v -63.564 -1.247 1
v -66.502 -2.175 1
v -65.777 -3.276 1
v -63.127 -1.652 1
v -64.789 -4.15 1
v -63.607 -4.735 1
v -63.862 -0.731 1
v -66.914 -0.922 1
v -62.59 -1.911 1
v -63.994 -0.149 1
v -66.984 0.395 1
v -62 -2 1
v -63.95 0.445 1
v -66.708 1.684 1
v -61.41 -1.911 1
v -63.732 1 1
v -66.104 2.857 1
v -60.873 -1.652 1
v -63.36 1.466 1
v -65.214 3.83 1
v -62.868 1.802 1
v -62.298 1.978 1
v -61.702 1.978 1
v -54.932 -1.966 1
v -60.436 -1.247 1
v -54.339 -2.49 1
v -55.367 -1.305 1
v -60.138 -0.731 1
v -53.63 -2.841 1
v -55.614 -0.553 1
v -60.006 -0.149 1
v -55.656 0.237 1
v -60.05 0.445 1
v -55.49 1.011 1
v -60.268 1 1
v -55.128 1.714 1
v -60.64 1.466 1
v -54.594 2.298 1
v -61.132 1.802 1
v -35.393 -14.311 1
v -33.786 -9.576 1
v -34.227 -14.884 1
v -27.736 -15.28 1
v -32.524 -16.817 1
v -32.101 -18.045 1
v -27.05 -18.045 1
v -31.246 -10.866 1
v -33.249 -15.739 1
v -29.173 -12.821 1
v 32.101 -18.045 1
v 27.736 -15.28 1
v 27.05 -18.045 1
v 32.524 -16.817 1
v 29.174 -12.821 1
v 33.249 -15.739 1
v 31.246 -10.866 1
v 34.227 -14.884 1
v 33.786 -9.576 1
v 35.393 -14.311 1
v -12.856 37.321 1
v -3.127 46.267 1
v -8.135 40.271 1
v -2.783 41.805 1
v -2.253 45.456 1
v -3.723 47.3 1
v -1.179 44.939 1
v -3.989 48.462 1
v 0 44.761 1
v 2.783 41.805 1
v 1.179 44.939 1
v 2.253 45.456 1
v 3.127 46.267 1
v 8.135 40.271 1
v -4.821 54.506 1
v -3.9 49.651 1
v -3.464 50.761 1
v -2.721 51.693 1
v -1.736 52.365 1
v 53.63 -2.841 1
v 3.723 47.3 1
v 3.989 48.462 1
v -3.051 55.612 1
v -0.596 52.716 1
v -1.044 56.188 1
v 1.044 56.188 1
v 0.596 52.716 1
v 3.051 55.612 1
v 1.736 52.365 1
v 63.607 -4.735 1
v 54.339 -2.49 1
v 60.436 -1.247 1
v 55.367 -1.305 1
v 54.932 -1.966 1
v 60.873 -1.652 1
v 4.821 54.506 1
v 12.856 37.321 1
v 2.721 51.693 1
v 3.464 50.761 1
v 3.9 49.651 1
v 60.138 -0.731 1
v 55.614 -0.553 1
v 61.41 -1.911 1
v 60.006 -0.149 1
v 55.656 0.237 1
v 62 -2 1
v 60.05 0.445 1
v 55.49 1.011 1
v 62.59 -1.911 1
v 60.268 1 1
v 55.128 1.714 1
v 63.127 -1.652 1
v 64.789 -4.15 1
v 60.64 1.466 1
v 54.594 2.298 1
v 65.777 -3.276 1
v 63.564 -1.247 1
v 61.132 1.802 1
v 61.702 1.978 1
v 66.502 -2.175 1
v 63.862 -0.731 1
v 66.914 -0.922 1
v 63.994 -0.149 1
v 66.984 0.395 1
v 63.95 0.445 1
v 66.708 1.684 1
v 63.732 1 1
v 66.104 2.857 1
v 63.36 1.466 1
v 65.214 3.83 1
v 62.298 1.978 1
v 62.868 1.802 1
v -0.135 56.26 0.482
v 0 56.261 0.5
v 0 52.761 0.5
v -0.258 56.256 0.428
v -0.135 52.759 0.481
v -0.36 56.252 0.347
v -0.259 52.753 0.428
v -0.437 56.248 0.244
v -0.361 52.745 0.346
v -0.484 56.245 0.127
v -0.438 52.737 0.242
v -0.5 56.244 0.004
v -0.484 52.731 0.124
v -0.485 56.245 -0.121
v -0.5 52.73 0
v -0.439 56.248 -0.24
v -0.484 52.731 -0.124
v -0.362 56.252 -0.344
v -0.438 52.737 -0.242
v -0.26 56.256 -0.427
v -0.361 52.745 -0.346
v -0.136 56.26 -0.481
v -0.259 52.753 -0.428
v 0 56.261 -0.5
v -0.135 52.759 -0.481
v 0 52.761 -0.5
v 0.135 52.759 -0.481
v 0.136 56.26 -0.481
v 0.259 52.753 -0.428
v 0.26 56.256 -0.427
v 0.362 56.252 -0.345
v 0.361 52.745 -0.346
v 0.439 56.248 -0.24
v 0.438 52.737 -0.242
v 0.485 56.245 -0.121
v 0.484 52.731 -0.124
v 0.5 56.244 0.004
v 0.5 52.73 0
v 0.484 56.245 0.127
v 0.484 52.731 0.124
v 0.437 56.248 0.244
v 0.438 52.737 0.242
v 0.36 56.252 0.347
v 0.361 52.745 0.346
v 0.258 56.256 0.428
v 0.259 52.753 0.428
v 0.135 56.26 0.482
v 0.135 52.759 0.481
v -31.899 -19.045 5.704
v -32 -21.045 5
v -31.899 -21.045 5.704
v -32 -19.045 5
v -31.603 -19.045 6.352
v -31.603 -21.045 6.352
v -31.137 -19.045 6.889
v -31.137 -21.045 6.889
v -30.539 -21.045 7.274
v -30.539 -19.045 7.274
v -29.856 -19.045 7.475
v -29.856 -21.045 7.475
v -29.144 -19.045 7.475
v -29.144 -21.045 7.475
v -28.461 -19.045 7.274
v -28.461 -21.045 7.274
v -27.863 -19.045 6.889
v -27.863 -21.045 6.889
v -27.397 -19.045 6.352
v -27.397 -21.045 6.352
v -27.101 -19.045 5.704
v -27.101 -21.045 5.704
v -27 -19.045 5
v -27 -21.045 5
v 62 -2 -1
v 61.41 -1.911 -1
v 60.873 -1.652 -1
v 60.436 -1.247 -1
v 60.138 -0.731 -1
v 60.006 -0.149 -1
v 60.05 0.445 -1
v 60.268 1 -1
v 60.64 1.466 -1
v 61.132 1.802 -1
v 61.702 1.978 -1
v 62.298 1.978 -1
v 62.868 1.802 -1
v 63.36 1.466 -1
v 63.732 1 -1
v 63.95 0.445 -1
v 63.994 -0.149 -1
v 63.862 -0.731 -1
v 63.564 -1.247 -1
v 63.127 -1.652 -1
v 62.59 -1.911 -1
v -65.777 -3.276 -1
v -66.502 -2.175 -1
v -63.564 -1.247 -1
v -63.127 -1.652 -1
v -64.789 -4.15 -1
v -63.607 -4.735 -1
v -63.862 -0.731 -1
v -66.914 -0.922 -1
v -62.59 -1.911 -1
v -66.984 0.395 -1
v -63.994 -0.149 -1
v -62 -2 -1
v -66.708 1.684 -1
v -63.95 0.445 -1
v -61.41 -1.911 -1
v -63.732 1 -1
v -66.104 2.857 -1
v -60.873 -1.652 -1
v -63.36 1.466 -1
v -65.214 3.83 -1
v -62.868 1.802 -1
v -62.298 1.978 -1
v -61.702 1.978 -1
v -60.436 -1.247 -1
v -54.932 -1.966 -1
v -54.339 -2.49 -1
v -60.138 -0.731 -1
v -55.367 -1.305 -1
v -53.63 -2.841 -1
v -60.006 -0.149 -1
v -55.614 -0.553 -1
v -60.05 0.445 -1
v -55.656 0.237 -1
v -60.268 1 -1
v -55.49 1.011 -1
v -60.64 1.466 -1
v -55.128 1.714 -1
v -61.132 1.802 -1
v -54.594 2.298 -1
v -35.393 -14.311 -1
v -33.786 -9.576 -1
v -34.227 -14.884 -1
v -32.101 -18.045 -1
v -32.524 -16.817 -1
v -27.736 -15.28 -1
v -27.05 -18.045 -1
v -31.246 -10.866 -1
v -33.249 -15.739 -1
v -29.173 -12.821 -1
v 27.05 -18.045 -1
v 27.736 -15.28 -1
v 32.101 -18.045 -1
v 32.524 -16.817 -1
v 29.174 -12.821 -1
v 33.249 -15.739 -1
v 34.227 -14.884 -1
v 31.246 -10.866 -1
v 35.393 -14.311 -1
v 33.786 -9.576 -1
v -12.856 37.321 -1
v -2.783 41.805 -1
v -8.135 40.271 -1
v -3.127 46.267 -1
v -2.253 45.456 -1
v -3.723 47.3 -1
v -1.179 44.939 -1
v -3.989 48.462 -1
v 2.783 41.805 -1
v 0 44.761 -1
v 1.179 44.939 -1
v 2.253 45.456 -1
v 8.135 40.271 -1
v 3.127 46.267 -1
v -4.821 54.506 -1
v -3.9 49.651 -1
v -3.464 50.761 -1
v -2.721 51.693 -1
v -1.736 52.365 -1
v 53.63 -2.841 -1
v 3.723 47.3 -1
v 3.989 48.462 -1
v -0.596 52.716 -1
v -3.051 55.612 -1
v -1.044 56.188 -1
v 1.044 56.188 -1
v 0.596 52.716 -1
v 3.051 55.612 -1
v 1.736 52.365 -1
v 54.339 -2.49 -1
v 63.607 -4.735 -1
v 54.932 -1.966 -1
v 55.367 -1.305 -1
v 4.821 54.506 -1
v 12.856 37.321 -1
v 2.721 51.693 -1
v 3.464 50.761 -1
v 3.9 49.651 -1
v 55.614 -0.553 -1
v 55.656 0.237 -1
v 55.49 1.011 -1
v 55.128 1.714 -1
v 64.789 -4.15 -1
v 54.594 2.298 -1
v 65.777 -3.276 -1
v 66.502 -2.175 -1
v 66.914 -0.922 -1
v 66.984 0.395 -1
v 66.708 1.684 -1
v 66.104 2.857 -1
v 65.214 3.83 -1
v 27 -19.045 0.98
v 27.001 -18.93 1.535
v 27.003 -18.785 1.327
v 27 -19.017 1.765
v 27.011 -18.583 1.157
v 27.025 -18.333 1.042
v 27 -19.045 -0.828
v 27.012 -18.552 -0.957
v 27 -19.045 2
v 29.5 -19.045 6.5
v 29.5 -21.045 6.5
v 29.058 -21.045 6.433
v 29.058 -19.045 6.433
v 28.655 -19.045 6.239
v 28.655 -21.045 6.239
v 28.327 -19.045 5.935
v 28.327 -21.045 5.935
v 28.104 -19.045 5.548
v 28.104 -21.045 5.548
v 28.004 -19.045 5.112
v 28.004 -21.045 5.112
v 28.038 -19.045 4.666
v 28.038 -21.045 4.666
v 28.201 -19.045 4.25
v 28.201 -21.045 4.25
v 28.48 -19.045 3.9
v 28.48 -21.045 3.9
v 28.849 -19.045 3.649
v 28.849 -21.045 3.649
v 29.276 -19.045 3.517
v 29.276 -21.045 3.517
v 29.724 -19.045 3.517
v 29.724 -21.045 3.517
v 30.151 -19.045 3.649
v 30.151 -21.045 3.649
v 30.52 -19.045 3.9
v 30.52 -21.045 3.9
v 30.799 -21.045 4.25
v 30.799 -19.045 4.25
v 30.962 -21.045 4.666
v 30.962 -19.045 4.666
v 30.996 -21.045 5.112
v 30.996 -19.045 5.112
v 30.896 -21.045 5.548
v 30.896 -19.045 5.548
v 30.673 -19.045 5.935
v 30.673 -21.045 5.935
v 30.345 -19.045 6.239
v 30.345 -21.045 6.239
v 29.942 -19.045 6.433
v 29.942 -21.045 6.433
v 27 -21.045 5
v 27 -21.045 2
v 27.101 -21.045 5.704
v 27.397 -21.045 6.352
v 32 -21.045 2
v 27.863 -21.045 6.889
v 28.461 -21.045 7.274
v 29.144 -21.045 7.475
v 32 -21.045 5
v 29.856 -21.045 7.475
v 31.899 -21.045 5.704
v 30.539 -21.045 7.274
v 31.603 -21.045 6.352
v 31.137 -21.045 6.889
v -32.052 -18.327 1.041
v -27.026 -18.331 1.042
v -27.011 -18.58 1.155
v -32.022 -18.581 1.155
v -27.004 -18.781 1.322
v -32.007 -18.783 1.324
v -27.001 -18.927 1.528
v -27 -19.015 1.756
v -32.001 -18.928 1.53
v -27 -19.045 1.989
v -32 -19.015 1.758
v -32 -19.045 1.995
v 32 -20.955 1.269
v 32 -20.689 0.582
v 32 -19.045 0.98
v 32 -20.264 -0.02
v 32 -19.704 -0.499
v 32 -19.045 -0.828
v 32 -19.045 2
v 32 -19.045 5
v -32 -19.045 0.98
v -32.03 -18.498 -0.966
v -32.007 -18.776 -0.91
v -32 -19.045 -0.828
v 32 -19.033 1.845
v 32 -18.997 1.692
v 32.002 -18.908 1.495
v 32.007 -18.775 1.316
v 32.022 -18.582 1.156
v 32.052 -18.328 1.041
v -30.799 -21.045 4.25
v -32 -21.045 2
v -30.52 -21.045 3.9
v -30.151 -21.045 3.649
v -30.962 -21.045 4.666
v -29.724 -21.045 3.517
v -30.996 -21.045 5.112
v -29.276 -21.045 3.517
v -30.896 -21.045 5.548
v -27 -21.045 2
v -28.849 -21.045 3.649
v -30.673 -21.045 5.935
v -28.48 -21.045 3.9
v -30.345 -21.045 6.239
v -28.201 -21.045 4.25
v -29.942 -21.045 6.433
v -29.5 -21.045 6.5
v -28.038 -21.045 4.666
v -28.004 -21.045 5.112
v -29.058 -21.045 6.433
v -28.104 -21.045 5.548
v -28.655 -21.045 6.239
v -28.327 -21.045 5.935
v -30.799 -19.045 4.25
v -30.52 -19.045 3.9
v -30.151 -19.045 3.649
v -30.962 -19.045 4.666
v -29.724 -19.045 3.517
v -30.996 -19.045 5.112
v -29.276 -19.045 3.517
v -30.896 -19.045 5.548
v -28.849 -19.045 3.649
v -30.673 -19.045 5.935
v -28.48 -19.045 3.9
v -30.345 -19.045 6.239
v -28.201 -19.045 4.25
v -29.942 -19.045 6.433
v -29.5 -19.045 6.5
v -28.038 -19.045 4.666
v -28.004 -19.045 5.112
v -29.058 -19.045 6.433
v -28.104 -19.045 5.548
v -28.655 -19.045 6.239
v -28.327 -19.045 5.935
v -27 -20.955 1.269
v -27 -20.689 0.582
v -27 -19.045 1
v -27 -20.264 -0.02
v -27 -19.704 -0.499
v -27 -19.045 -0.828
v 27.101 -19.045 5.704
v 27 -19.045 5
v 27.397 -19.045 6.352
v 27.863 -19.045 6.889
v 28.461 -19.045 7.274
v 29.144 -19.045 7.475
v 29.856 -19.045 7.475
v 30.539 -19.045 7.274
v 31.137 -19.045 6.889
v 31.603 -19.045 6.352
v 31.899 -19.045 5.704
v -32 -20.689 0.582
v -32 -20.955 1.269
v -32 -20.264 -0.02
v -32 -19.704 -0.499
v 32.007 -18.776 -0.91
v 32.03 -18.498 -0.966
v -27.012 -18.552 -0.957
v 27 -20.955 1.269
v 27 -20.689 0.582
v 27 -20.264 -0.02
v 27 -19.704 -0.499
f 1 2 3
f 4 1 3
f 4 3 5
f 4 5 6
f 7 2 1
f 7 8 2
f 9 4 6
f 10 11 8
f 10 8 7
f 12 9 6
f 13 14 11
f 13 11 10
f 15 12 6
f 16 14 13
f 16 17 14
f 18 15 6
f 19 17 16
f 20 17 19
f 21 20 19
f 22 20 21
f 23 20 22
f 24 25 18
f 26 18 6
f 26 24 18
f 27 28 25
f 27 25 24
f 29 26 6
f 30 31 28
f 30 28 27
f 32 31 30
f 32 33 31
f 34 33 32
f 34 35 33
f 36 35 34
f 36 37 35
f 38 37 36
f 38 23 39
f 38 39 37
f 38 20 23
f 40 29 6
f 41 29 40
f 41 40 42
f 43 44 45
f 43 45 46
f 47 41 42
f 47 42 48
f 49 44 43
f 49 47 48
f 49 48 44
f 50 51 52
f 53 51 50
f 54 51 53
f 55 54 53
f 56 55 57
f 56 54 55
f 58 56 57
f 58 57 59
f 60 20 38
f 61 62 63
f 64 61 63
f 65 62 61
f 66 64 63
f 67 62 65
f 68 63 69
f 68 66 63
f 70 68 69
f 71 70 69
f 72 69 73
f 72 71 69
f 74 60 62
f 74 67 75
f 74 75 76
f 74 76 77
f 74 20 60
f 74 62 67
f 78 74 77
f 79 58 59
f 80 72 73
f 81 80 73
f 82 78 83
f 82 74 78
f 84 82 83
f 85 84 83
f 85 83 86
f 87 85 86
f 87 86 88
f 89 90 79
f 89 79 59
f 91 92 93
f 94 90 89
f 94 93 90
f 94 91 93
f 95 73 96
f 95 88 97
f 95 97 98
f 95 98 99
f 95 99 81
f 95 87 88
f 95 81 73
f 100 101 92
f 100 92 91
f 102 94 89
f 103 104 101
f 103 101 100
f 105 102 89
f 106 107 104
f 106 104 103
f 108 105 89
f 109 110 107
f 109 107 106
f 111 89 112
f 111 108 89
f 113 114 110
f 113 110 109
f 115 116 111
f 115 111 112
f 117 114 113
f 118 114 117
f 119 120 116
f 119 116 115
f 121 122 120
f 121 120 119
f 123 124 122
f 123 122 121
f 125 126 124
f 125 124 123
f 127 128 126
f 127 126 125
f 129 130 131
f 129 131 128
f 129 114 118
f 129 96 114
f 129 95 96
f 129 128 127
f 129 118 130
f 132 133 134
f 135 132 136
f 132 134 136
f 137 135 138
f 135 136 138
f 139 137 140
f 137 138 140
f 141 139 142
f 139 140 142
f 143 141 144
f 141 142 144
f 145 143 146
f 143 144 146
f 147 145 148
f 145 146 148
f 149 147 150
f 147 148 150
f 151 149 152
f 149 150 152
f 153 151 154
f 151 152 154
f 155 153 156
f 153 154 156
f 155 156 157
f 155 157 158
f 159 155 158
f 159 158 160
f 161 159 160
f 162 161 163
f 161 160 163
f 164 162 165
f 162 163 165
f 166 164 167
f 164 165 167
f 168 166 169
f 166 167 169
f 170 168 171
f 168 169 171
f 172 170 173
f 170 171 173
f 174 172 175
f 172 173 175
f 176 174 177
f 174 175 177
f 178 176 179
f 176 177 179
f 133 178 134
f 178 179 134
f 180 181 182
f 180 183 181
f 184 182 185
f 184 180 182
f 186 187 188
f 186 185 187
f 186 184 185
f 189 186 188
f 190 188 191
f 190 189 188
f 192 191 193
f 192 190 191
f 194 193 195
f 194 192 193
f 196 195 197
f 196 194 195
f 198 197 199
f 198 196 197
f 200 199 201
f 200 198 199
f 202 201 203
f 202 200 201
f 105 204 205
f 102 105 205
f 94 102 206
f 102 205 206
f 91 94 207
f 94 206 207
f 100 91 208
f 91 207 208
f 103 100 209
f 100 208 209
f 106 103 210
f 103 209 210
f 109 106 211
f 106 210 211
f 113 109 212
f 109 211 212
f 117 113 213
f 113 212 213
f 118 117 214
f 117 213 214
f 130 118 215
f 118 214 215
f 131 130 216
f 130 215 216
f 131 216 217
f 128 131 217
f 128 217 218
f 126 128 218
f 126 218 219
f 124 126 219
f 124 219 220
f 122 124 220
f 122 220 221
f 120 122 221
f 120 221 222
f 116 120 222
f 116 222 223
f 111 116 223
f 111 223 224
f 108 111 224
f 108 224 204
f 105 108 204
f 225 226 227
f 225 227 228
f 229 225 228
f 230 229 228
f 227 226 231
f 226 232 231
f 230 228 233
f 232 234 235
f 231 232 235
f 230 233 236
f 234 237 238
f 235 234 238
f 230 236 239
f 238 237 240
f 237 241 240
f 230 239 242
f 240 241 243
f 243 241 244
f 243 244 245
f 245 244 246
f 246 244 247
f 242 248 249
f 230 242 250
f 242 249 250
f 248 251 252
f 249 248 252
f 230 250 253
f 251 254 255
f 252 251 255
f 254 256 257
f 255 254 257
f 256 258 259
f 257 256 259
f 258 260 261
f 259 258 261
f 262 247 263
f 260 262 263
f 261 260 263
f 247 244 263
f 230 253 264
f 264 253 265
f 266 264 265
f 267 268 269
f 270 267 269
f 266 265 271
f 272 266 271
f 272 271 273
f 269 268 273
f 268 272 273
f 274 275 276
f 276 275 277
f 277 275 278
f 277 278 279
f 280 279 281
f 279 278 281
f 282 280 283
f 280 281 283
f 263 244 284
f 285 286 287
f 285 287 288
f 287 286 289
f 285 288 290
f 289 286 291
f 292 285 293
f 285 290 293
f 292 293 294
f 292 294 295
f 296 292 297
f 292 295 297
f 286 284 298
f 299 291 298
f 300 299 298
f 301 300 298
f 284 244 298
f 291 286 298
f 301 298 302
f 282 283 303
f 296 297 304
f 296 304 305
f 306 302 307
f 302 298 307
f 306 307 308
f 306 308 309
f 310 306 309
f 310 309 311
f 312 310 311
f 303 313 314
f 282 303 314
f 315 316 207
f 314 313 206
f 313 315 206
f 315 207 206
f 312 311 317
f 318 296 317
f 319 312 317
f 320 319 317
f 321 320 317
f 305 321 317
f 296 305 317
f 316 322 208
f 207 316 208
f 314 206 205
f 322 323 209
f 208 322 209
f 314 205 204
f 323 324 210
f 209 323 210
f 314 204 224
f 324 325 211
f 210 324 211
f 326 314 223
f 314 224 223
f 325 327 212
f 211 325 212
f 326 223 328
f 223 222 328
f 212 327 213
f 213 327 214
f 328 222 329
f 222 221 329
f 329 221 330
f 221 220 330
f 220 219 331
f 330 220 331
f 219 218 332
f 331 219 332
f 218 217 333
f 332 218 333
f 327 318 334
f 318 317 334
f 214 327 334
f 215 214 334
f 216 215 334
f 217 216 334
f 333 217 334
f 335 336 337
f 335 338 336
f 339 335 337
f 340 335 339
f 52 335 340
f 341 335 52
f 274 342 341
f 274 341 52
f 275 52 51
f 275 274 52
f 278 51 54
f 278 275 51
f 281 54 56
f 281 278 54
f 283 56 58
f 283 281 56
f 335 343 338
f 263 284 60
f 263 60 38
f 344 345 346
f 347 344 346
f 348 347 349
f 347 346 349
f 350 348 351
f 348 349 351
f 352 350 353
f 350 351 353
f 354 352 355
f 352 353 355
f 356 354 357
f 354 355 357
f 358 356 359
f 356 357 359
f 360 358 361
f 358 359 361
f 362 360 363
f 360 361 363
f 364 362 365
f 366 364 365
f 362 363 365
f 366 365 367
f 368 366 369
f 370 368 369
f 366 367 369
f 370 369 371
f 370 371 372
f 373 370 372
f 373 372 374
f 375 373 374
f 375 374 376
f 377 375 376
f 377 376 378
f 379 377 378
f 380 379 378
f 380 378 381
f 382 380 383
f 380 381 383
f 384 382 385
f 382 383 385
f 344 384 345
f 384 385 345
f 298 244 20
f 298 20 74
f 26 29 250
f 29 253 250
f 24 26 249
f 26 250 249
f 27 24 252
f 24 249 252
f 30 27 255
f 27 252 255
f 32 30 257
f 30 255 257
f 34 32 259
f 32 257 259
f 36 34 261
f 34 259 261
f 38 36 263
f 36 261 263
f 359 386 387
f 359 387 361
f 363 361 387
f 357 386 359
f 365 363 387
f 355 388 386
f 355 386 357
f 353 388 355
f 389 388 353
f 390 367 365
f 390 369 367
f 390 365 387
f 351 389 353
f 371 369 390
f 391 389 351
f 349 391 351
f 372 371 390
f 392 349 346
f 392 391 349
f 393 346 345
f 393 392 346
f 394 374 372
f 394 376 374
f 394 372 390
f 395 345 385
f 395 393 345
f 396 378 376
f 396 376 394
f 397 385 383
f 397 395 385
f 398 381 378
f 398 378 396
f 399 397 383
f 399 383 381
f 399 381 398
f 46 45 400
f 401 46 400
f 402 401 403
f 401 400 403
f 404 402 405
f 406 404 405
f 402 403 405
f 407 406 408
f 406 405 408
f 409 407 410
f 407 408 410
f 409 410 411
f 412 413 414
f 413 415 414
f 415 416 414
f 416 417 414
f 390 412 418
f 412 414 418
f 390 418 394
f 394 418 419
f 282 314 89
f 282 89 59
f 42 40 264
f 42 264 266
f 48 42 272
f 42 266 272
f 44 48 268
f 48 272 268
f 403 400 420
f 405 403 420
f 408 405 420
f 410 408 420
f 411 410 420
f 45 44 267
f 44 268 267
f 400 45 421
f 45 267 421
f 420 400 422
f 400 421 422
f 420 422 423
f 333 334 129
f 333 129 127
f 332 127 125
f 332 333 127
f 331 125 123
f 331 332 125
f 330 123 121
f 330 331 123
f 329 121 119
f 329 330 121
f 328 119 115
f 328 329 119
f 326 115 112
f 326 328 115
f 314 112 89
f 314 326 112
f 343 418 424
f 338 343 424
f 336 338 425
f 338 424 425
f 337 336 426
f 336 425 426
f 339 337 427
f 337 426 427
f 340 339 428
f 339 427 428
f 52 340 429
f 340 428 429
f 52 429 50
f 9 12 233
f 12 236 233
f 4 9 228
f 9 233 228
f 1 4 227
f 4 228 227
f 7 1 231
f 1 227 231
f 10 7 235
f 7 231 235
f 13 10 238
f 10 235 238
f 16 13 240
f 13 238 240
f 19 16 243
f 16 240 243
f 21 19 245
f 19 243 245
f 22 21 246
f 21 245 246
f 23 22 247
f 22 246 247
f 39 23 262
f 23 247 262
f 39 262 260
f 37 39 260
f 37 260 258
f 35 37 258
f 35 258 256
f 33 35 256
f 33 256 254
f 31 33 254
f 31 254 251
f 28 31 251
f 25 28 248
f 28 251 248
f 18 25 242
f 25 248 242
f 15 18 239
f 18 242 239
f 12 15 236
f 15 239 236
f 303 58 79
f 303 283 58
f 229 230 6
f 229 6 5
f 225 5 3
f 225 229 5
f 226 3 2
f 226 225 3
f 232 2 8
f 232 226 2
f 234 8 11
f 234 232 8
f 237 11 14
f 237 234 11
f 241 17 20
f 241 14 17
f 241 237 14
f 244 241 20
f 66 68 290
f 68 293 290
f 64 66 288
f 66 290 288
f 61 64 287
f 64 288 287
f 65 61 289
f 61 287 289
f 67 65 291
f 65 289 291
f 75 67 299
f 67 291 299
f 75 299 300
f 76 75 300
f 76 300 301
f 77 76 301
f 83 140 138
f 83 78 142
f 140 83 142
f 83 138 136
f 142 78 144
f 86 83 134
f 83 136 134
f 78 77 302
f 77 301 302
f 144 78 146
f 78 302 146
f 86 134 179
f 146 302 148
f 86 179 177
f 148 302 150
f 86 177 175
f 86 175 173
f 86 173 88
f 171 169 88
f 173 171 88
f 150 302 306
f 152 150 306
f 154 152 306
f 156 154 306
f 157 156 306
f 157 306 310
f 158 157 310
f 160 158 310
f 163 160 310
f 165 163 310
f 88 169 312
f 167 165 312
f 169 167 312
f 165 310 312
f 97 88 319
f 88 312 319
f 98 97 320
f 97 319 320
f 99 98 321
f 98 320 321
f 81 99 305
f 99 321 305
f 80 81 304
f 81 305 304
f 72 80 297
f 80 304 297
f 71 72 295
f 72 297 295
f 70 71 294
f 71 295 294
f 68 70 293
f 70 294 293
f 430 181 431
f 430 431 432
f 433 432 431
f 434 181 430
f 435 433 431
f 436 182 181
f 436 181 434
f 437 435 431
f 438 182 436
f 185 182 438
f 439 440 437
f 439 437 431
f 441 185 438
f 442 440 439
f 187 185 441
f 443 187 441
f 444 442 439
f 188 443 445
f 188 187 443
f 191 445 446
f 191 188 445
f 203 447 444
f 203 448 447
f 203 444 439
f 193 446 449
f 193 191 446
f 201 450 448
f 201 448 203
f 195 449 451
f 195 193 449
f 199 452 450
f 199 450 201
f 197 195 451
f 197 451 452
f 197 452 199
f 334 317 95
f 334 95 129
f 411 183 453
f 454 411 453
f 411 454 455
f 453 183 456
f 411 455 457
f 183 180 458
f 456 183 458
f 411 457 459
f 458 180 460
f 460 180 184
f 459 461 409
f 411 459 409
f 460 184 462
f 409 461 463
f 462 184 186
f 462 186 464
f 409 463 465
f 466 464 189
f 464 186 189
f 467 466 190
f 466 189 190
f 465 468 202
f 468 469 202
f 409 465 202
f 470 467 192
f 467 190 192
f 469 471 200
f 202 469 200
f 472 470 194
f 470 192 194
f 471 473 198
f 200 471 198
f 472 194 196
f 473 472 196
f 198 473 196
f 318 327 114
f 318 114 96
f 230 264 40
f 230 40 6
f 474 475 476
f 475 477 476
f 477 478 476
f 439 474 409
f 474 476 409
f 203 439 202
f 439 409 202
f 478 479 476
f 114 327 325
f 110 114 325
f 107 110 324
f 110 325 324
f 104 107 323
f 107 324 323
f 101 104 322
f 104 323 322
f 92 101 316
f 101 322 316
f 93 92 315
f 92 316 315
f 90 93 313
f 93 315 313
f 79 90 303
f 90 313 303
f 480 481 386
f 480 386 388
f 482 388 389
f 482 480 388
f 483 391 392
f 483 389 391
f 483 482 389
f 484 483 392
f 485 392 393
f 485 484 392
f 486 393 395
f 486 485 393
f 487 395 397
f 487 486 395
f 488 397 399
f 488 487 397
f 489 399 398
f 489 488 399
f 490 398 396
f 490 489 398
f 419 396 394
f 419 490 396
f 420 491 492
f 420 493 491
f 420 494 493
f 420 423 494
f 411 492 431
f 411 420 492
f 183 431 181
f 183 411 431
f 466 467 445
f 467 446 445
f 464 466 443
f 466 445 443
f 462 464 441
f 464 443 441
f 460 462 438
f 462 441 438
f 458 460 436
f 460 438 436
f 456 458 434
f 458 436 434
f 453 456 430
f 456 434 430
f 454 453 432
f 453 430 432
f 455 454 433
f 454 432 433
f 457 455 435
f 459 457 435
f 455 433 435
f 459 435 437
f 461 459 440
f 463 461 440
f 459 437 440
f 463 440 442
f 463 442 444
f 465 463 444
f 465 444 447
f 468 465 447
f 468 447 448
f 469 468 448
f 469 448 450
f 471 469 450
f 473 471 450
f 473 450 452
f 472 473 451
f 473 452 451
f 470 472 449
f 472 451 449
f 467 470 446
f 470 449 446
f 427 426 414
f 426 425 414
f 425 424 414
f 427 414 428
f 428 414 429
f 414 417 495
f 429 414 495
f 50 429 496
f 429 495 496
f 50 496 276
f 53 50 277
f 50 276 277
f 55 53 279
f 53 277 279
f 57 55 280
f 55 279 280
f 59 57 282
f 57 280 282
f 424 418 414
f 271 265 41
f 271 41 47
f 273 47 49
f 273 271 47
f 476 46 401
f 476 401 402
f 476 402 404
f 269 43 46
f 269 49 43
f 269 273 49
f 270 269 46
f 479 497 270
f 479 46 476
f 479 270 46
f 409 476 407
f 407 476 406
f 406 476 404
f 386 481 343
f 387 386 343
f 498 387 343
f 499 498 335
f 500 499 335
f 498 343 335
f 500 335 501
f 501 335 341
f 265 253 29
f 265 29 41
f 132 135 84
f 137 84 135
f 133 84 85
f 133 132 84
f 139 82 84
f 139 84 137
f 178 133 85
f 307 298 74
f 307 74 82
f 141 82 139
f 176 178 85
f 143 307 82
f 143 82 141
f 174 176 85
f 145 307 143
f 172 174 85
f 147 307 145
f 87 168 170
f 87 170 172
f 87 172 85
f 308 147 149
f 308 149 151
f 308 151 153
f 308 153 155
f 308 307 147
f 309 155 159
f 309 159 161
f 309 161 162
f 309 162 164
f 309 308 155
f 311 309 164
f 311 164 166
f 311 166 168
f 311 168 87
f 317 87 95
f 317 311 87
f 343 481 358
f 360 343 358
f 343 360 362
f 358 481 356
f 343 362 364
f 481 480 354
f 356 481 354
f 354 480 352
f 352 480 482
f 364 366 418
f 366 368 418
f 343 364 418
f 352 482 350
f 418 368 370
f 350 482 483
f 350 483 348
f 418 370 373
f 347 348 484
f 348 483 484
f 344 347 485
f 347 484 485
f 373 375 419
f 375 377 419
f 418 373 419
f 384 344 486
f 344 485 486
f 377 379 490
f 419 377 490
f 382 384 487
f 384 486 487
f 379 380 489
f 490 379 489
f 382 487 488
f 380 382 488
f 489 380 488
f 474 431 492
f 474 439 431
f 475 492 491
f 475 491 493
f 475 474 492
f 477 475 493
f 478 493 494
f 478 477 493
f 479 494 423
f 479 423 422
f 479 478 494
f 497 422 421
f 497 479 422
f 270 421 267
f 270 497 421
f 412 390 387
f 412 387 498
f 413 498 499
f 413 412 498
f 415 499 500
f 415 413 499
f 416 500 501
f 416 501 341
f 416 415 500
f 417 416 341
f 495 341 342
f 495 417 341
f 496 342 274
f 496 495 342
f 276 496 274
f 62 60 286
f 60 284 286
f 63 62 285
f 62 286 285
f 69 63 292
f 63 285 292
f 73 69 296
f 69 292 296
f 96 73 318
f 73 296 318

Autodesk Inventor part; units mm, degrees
ref_plane "YZ Plane" through (0, 0, 0) normal (1, 0, 0) x (0, 1, 0)
sketch "Sketch1" plane through (0, 0, 0) normal (0, 0, 1) x (1, 0, 0)
  line L0 (-14.081, 0) -> (14.081, 0) construction
  line L1 (0, -22) -> (0, 22) construction
  arc A0 (12.8558, 37.3209) -> (-12.8558, 37.3209) centre (0, 22) ccw
  line L2 (-65.2139, 3.8302) -> (-4.8209, 54.5062)
  arc A1 (4.8209, 54.5062) -> (-4.8209, 54.5062) centre (0, 48.7609) ccw
  line L3 (4.8209, 54.5062) -> (65.2139, 3.8302)
  arc A2 (63.607, -4.7347) -> (65.2139, 3.8302) centre (62, 0) ccw
  line L4 (63.607, -4.7347) -> (35.393, -14.3106)
  arc A3 (35.393, -14.3106) -> (32, -19.0453) centre (37, -19.0453) ccw
  line L5 (32, -19.0453) -> (32, -21.0453) construction
  line L6 (27, -21.0453) -> (27, -19.0453) construction
  arc A4 (33.7861, -9.5759) -> (27, -19.0453) centre (37, -19.0453) ccw
  line L7 (33.7861, -9.5759) -> (53.6299, -2.8408)
  arc A5 (53.6299, -2.8408) -> (54.5941, 2.2981) centre (52.6657, 0) ccw
  line L8 (54.5941, 2.2981) -> (12.8558, 37.3209)
  line L9 (-12.8558, 37.3209) -> (-54.5941, 2.2981)
  arc A6 (-54.5941, 2.2981) -> (-53.6299, -2.8408) centre (-52.6657, 0) ccw
  line L10 (-53.6299, -2.8408) -> (-33.7861, -9.5759)
  arc A7 (-27, -19.0453) -> (-33.7861, -9.5759) centre (-37, -19.0453) ccw
  line L11 (-27, -19.0453) -> (-27, -21.0453) construction
  line L12 (-32, -21.0453) -> (-32, -19.0453) construction
  arc A8 (-32, -19.0453) -> (-35.393, -14.3106) centre (-37, -19.0453) ccw
  line L13 (-35.393, -14.3106) -> (-63.607, -4.7347)
  arc A9 (-65.2139, 3.8302) -> (-63.607, -4.7347) centre (-62, 0) ccw
  line L14 (-32, -19.0453) -> (-27, -19.0453)
  line L15 (32, -19.0453) -> (27, -19.0453)
  point P0 (0, 0)
  point P1 (0, 0)
  point P2 (-29.5, -21.0453)
  point P3 (29.5, -21.0453)
  dimension "d0" = 40
  dimension "d1" = 22
  dimension "d2" = 8
  dimension "d3" = 3
  dimension "d4" = 3
  dimension "d5" = 5
  dimension "d6" = 5
  dimension "d7" = 5
  dimension "d8" = 5
  dimension "d9" = 7.5
  dimension "d10" = 8
  dimension "d11" = 124
  dimension "d12" = 62
  dimension "d13" = 10
  dimension "d14" = 5
  dimension "d15" = 10
  dimension "d16" = 5
  dimension "d17" = 5
  dimension "d18" = 48.7609
  dimension "d20" = 29.5
  dimension "d21" = 59
extrude "Extrusion1" add sketch "Sketch1" along normal mid plane 2
ref_plane "Work Plane5" through (27, -19.0453, 1) normal (0, -1, 0) x (1, 0, 0)
sketch "Sketch5" plane through (27, -19.0453, 1) normal (0, -1, 0) x (1, 0, 0)
  line L0 (-54, -2) -> (-59, -2) projected
  line L1 (-54, -2) -> (-54, 0) projected
  line L2 (-59, 0) -> (-54, 0) projected
  line L3 (-59, -2) -> (-59, 0) projected
  line L4 (-54, -2) -> (-59, -2) projected
  line L5 (5, -2) -> (5, 0) projected
  line L6 (0, 0) -> (5, 0) projected
  line L7 (0, 0) -> (0, -2) projected
  line L8 (5, -2) -> (0, -2) projected
  line L9 (0, 0) -> (5, 0) projected
  line L10 (5, 0) -> (5, 4)
  arc A0 (5, 4) -> (0, 4) centre (2.5, 4) ccw
  line L11 (0, 4) -> (0, 0)
  line L12 (38.2139, 0) -> (-22.1791, 0) projected
  line L13 (-54, 0) -> (-54, 4)
  arc A1 (-54, 4) -> (-59, 4) centre (-56.5, 4) ccw
  line L14 (-59, 4) -> (-59, 0)
  point P0 (-27, -1)
  dimension "d29" = 2.5
  dimension "d30" = 2.5
  dimension "d31" = 4
  dimension "d32" = 4
extrude "Extrusion2" add sketch "Sketch5" along normal blind 2
fillet "Fillet3" radius 1 2 edges at (-29.5, -19.0453, 1) (29.5, -19.0453, 1)
fillet "Fillet4" radius 3 2 edges at (-29.5, -21.0453, -1) (29.5, -21.0453, -1)
sketch "Sketch7" plane through (27, -19.0453, 1) normal (0, 1, 0) x (1, 0, 0)
  arc A0 (-59, -4) -> (-54, -4) centre (-56.5, -4) ccw projected
  arc A1 (0, -4) -> (5, -4) centre (2.5, -4) ccw projected
  point P0 (-27, 1)
hole "Hole2" at (-29.5, -19.0453, 5) at (29.5, -19.0453, 5) direction (0, -1, 0) diameter 3 depth 2
sketch "Sketch8" plane through (0, 0, 1) normal (0, 0, 1) x (1, 0, 0)
  arc A0 (-65.2139, 3.8302) -> (-63.607, -4.7347) centre (-62, 0) ccw projected
  arc A1 (63.607, -4.7347) -> (65.2139, 3.8302) centre (62, 0) ccw projected
  point P0 (0, 0)
hole "Hole3" at (-62, 0, 1) at (62, 0, 1) direction (0, 0, -1) diameter 4 depth 2
sketch "Sketch9" plane through (0, 0, 1) normal (0, 0, 1) x (1, 0, 0)
  arc A0 (4.8209, 54.5062) -> (-4.8209, 54.5062) centre (0, 48.7609) ccw projected
  point P0 (0, 0)
hole "Hole4" at (0, 48.7609, 1) direction (0, 0, -1) diameter 8 depth 2
ref_plane "Work Plane6" through (0, 56.5, 0) normal (0, 1, 0) x (-1, 0, 0)
sketch "Sketch10" plane through (0, 56.5, 0) normal (0, 1, 0) x (-1, 0, 0)
  point P0 (0, 0)
  point P1 (0, 0)
hole "Hole5" at (0, 56.5, 0) direction (0, -1, 0) diameter 1 depth 4
equation "\"d4\" = d3"
equation "\"d6\" = d5"
equation "\"d10\" = d2"
equation "\"d12\" = 0.5 * d11"
equation "\"d15\" = d13"
equation "\"d16\" = d14"
equation "\"d21\" = 2 * d20"
equation "\"d32\" = d31"
properties part number "01"
